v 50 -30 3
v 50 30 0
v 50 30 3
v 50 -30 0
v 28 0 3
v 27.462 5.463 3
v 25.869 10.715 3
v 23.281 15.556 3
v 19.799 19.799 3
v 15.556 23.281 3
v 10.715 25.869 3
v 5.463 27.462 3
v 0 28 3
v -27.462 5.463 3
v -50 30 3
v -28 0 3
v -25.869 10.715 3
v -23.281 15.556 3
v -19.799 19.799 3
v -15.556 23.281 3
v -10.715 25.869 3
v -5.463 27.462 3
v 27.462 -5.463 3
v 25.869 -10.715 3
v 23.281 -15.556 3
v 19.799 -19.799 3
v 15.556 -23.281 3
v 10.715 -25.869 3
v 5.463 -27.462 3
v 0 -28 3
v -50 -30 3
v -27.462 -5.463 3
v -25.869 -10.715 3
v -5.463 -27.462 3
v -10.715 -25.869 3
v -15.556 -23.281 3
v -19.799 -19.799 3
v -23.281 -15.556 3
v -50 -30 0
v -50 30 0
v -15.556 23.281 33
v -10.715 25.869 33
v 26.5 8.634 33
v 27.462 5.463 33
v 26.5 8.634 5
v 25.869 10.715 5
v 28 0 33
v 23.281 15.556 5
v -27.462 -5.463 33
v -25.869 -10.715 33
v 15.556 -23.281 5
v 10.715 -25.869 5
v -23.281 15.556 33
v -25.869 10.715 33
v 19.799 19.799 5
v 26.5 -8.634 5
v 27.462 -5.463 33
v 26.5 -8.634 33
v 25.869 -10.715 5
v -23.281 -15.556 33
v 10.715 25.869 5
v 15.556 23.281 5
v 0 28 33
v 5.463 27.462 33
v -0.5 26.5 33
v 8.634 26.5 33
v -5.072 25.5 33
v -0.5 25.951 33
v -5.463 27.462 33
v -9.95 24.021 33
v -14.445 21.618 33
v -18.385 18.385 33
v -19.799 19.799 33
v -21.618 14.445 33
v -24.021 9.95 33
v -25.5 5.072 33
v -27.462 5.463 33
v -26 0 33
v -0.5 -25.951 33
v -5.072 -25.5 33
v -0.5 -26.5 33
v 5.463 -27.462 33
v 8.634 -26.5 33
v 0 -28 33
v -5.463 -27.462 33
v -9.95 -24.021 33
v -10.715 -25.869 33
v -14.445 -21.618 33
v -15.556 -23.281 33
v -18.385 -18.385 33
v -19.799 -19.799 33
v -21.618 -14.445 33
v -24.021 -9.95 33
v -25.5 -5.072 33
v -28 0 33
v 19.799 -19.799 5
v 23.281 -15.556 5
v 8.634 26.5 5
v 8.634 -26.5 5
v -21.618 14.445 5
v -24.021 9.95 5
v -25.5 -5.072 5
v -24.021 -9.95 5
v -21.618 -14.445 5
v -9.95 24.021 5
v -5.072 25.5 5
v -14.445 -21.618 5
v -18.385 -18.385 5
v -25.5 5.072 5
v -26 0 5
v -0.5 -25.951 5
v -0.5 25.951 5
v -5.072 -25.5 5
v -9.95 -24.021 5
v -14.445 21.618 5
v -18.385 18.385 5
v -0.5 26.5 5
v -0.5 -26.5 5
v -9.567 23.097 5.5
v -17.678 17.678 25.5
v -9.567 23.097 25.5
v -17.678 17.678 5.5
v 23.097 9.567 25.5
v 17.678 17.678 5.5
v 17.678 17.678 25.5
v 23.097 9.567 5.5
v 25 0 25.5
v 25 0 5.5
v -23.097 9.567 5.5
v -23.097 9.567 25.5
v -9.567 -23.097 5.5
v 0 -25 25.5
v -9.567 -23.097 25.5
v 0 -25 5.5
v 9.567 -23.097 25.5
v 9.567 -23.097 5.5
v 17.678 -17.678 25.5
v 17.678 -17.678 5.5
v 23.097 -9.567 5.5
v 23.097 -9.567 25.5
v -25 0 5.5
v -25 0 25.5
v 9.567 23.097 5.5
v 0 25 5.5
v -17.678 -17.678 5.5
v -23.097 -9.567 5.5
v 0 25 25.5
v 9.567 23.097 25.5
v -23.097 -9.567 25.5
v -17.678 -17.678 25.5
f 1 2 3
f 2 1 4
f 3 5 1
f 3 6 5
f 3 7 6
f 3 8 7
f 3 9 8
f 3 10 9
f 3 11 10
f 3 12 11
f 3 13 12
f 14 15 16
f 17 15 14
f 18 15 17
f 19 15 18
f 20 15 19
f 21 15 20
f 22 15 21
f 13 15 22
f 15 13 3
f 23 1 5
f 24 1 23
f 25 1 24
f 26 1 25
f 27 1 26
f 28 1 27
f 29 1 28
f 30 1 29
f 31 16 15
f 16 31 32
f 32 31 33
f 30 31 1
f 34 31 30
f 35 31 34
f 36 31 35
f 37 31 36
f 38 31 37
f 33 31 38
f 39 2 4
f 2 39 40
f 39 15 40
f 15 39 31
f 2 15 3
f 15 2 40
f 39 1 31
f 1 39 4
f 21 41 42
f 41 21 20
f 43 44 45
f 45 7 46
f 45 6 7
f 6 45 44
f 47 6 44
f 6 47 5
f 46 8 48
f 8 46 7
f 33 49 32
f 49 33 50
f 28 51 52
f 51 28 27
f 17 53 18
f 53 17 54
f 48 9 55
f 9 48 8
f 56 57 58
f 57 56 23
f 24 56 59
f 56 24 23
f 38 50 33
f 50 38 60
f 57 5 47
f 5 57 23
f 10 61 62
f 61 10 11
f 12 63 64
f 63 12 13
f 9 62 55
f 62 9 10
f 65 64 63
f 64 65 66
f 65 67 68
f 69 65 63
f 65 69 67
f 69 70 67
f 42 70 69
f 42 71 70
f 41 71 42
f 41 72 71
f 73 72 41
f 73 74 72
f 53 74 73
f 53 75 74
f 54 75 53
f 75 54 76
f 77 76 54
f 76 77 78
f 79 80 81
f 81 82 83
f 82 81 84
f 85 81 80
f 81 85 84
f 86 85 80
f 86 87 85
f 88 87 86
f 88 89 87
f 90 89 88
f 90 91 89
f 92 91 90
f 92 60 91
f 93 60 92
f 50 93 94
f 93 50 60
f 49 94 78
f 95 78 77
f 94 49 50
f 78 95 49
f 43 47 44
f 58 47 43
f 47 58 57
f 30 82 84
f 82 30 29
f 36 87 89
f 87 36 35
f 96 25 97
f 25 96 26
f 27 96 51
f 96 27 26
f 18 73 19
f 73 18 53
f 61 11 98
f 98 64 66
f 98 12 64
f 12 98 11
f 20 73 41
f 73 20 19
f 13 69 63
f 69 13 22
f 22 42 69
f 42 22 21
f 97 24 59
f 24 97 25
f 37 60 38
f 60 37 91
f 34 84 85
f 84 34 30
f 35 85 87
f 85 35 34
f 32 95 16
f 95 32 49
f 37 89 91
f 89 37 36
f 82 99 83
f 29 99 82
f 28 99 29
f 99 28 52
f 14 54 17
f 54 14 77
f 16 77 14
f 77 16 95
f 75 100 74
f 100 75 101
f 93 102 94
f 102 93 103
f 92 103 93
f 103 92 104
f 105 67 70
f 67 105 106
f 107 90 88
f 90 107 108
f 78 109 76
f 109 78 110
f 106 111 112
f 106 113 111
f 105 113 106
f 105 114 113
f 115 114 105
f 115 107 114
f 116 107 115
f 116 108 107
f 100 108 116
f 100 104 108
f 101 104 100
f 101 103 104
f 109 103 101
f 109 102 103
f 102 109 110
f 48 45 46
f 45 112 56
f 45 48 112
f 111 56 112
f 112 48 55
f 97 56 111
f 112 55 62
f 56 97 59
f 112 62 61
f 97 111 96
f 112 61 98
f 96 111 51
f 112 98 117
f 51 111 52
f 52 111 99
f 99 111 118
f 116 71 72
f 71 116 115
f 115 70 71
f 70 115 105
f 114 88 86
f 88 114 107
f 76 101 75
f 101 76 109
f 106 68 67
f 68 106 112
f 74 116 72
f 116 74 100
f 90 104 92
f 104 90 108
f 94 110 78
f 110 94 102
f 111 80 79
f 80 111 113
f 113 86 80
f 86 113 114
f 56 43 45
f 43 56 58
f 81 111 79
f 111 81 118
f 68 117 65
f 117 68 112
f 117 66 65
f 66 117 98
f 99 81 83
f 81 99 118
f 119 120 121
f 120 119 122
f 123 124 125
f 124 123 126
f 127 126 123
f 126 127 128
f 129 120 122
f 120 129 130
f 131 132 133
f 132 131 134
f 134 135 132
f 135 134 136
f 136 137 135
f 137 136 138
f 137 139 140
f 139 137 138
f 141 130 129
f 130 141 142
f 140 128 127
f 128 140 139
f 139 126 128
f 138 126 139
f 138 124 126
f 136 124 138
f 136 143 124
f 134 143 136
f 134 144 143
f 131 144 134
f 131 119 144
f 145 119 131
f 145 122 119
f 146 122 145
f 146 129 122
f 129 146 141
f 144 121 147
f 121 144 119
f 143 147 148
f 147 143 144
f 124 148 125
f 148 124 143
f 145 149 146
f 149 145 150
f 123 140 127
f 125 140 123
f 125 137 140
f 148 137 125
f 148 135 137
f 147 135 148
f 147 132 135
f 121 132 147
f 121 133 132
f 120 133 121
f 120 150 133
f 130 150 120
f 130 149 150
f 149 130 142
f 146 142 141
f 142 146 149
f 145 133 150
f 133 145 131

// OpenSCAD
// file: ../models/part_two.scad
// ============================================================
// PART: Part Two
// Description: Holder/mount component for [PROJECT_NAME]
// ============================================================

include <../config.scad>
include <consts.scad>

// ============================================================
// PART MODULE
// ============================================================

// Module: part_two()
// Usage:
//   part_two();
//   part_two(height, wall);
// Description:
//   Creates a holder/mount component with a slot
// Arguments:
//   height = Overall height of the holder. Default: BASE_HEIGHT
//   wall = Wall thickness. Default: WALL_THICKNESS
// Example(3D): Standard holder
//   part_two();
// Example(3D): Taller holder with thicker walls
//   part_two(height=50, wall=3);
module part_two(
    height = BASE_HEIGHT,
    wall = WALL_THICKNESS
) {
    difference() {
        // Main body - cylinder or rounded rectangle
        translate([0, 0, height/2])
            cylinder(
                d = SLOT_WIDTH + wall * 2,
                h = height,
                center = true
            );

        // Slot for widget
        translate([0, 0, wall])
            cylinder(
                d = SLOT_WIDTH,
                h = height,
                center = false
            );

        // Side opening for insertion
        translate([SLOT_WIDTH/4, 0, height/2 + wall])
            cube([
                SLOT_WIDTH/2 + 1,
                SLOT_WIDTH + 1,
                height
            ], center = true);
    }
}

// ============================================================
// RENDER
// ============================================================

// Render this part when file is opened directly
part_two();
// file: ../models/part_one.scad
// ============================================================
// PART: Part One
// Description: Base plate for [PROJECT_NAME]
// ============================================================

include <../config.scad>
include <consts.scad>

// ============================================================
// PART MODULE
// ============================================================

// Module: part_one()
// Usage:
//   part_one();
//   part_one(width, depth, thickness);
// Description:
//   Creates the base plate with mounting holes
// Arguments:
//   width = Width of the base plate. Default: BASE_WIDTH
//   depth = Depth of the base plate. Default: BASE_DEPTH
//   thickness = Thickness of the plate. Default: FLOOR_THICKNESS
// Example(3D): Standard base plate
//   part_one();
// Example(3D): Custom sized base plate
//   part_one(width=150, depth=80, thickness=5);
module part_one(
    width = BASE_WIDTH,
    depth = BASE_DEPTH,
    thickness = FLOOR_THICKNESS
) {
    difference() {
        // Main plate body
        translate([0, 0, thickness/2])
            cube([width, depth, thickness], center = true);

        // Mounting holes at corners
        for (x = [-1, 1], y = [-1, 1]) {
            translate([
                x * MOUNTING_HOLE_SPACING/2,
                y * MOUNTING_HOLE_SPACING/2,
                -0.1
            ])
                cylinder(
                    d = MOUNTING_HOLE_DIAMETER,
                    h = thickness + 0.2,
                    $fn = EXPORT_MODE ? 64 : 16
                );
        }
    }
}

// ============================================================
// RENDER
// ============================================================

// Render this part when file is opened directly
part_one();
// file: ../models/consts.scad
// ============================================================
// SHARED CONSTANTS
// Description: Constants used by multiple parts in [PROJECT_NAME]
// ============================================================

// ============================================================
// WIDGET DIMENSIONS
// ============================================================
// Example: If your project holds/fits a specific object,
// define its dimensions here

// Widget dimensions (example - replace with your actual object)
WIDGET_DIAMETER = 50;
WIDGET_HEIGHT = 20;

// ============================================================
// CALCULATED DIMENSIONS
// ============================================================
// Dimensions derived from base constants and tolerances

// Slot/holder sizing with clearance
SLOT_WIDTH = WIDGET_DIAMETER + 2;      // 2mm total clearance
SLOT_HEIGHT = WIDGET_HEIGHT + 1;       // 1mm clearance

// Spacing between elements
ELEMENT_SPACING = WIDGET_DIAMETER + 10;  // 10mm gap between widgets

// ============================================================
// EXAMPLE USAGE
// ============================================================
// In your part files:
//   include <consts.scad>
//   cylinder(d = WIDGET_DIAMETER + TOLERANCE, h = WIDGET_HEIGHT);
// file: ../config.scad
// ============================================================
// PROJECT CONFIGURATION
// Description: Global settings for [PROJECT_NAME]
// ============================================================

// ============================================================
// RENDERING SETTINGS
// ============================================================

// Preview quality (lower = faster preview)
PREVIEW_FN = 32;

// Export quality (higher = smoother STL)
EXPORT_FN = 128;

// Current mode (set to true when exporting STL)
// Override from command line: openscad -D 'EXPORT_MODE=true' ...
EXPORT_MODE = false;

// Convenience variable - automatically use correct quality
$fn = EXPORT_MODE ? EXPORT_FN : PREVIEW_FN;

// ============================================================
// PROJECT DIMENSIONS
// ============================================================

// Base dimensions (millimeters)
BASE_WIDTH = 100;
BASE_DEPTH = 60;
BASE_HEIGHT = 30;

// Material settings
WALL_THICKNESS = 2;
FLOOR_THICKNESS = 3;

// Hardware
MOUNTING_HOLE_DIAMETER = 5;
MOUNTING_HOLE_SPACING = 80;

// ============================================================
// TOLERANCES
// ============================================================

// General fit tolerance (for sliding parts)
TOLERANCE = 0.2;

// Tight fit (press-fit, requires force)
TIGHT_FIT = 0.1;

// Loose fit (easy sliding, clearance)
LOOSE_FIT = 0.5;

// 3D printer compensation (add to holes, subtract from pegs)
PRINTER_TOLERANCE = 0.15;

// ============================================================
// FEATURE FLAGS
// ============================================================

// Enable experimental features
ENABLE_ADVANCED_FEATURES = false;

// Include support structures in export
INCLUDE_SUPPORTS = false;

// Show reference geometry in previews
SHOW_REFERENCE = true;

// ============================================================
// RENDERING HELPERS
// ============================================================

// Helper function to determine if we're in preview mode
function is_preview() = !EXPORT_MODE;

// Helper function to determine if we're in export mode
function is_export() = EXPORT_MODE;
// main file
// ============================================================
// PREVIEW: Fit Test
// Description: Tests clearances and fit between parts
// ============================================================
// Use this to verify tolerances and part alignment

include <../config.scad>
include <../models/consts.scad>

use <../models/part_one.scad>
use <../models/part_two.scad>

// Override for faster preview
$fn = 16;

// ============================================================
// FIT TEST VIEW
// ============================================================

// Show cross-section for clearance checking
intersection() {
    union() {
        // Base plate
        color("lightblue")
            part_one();

        // Single holder for testing
        translate([0, 0, FLOOR_THICKNESS])
        color("gray")
            part_two();

        // Widget in holder
        translate([0, 0, FLOOR_THICKNESS + WALL_THICKNESS + SLOT_HEIGHT/2])
        color("yellow", alpha=0.5)
            cylinder(
                d = WIDGET_DIAMETER,
                h = WIDGET_HEIGHT,
                center = true,
                $fn = 16
            );
    }

    // Cut plane (comment out to see full view)
    translate([0, 0, 50])
        cube([200, 200, 100], center=true);
}

// ============================================================
// MEASUREMENT GUIDES
// ============================================================

// Show clearance dimensions
%color("red") {
    // Vertical clearance indicator
    translate([SLOT_WIDTH/2 + 10, 0, FLOOR_THICKNESS + WALL_THICKNESS])
        cylinder(d=0.5, h=SLOT_HEIGHT, $fn=8);

    // Horizontal clearance indicator
    translate([0, SLOT_WIDTH/2 + 5, BASE_HEIGHT/2])
        rotate([0, 90, 0])
            cylinder(d=0.5, h=SLOT_WIDTH, center=true, $fn=8);
}
